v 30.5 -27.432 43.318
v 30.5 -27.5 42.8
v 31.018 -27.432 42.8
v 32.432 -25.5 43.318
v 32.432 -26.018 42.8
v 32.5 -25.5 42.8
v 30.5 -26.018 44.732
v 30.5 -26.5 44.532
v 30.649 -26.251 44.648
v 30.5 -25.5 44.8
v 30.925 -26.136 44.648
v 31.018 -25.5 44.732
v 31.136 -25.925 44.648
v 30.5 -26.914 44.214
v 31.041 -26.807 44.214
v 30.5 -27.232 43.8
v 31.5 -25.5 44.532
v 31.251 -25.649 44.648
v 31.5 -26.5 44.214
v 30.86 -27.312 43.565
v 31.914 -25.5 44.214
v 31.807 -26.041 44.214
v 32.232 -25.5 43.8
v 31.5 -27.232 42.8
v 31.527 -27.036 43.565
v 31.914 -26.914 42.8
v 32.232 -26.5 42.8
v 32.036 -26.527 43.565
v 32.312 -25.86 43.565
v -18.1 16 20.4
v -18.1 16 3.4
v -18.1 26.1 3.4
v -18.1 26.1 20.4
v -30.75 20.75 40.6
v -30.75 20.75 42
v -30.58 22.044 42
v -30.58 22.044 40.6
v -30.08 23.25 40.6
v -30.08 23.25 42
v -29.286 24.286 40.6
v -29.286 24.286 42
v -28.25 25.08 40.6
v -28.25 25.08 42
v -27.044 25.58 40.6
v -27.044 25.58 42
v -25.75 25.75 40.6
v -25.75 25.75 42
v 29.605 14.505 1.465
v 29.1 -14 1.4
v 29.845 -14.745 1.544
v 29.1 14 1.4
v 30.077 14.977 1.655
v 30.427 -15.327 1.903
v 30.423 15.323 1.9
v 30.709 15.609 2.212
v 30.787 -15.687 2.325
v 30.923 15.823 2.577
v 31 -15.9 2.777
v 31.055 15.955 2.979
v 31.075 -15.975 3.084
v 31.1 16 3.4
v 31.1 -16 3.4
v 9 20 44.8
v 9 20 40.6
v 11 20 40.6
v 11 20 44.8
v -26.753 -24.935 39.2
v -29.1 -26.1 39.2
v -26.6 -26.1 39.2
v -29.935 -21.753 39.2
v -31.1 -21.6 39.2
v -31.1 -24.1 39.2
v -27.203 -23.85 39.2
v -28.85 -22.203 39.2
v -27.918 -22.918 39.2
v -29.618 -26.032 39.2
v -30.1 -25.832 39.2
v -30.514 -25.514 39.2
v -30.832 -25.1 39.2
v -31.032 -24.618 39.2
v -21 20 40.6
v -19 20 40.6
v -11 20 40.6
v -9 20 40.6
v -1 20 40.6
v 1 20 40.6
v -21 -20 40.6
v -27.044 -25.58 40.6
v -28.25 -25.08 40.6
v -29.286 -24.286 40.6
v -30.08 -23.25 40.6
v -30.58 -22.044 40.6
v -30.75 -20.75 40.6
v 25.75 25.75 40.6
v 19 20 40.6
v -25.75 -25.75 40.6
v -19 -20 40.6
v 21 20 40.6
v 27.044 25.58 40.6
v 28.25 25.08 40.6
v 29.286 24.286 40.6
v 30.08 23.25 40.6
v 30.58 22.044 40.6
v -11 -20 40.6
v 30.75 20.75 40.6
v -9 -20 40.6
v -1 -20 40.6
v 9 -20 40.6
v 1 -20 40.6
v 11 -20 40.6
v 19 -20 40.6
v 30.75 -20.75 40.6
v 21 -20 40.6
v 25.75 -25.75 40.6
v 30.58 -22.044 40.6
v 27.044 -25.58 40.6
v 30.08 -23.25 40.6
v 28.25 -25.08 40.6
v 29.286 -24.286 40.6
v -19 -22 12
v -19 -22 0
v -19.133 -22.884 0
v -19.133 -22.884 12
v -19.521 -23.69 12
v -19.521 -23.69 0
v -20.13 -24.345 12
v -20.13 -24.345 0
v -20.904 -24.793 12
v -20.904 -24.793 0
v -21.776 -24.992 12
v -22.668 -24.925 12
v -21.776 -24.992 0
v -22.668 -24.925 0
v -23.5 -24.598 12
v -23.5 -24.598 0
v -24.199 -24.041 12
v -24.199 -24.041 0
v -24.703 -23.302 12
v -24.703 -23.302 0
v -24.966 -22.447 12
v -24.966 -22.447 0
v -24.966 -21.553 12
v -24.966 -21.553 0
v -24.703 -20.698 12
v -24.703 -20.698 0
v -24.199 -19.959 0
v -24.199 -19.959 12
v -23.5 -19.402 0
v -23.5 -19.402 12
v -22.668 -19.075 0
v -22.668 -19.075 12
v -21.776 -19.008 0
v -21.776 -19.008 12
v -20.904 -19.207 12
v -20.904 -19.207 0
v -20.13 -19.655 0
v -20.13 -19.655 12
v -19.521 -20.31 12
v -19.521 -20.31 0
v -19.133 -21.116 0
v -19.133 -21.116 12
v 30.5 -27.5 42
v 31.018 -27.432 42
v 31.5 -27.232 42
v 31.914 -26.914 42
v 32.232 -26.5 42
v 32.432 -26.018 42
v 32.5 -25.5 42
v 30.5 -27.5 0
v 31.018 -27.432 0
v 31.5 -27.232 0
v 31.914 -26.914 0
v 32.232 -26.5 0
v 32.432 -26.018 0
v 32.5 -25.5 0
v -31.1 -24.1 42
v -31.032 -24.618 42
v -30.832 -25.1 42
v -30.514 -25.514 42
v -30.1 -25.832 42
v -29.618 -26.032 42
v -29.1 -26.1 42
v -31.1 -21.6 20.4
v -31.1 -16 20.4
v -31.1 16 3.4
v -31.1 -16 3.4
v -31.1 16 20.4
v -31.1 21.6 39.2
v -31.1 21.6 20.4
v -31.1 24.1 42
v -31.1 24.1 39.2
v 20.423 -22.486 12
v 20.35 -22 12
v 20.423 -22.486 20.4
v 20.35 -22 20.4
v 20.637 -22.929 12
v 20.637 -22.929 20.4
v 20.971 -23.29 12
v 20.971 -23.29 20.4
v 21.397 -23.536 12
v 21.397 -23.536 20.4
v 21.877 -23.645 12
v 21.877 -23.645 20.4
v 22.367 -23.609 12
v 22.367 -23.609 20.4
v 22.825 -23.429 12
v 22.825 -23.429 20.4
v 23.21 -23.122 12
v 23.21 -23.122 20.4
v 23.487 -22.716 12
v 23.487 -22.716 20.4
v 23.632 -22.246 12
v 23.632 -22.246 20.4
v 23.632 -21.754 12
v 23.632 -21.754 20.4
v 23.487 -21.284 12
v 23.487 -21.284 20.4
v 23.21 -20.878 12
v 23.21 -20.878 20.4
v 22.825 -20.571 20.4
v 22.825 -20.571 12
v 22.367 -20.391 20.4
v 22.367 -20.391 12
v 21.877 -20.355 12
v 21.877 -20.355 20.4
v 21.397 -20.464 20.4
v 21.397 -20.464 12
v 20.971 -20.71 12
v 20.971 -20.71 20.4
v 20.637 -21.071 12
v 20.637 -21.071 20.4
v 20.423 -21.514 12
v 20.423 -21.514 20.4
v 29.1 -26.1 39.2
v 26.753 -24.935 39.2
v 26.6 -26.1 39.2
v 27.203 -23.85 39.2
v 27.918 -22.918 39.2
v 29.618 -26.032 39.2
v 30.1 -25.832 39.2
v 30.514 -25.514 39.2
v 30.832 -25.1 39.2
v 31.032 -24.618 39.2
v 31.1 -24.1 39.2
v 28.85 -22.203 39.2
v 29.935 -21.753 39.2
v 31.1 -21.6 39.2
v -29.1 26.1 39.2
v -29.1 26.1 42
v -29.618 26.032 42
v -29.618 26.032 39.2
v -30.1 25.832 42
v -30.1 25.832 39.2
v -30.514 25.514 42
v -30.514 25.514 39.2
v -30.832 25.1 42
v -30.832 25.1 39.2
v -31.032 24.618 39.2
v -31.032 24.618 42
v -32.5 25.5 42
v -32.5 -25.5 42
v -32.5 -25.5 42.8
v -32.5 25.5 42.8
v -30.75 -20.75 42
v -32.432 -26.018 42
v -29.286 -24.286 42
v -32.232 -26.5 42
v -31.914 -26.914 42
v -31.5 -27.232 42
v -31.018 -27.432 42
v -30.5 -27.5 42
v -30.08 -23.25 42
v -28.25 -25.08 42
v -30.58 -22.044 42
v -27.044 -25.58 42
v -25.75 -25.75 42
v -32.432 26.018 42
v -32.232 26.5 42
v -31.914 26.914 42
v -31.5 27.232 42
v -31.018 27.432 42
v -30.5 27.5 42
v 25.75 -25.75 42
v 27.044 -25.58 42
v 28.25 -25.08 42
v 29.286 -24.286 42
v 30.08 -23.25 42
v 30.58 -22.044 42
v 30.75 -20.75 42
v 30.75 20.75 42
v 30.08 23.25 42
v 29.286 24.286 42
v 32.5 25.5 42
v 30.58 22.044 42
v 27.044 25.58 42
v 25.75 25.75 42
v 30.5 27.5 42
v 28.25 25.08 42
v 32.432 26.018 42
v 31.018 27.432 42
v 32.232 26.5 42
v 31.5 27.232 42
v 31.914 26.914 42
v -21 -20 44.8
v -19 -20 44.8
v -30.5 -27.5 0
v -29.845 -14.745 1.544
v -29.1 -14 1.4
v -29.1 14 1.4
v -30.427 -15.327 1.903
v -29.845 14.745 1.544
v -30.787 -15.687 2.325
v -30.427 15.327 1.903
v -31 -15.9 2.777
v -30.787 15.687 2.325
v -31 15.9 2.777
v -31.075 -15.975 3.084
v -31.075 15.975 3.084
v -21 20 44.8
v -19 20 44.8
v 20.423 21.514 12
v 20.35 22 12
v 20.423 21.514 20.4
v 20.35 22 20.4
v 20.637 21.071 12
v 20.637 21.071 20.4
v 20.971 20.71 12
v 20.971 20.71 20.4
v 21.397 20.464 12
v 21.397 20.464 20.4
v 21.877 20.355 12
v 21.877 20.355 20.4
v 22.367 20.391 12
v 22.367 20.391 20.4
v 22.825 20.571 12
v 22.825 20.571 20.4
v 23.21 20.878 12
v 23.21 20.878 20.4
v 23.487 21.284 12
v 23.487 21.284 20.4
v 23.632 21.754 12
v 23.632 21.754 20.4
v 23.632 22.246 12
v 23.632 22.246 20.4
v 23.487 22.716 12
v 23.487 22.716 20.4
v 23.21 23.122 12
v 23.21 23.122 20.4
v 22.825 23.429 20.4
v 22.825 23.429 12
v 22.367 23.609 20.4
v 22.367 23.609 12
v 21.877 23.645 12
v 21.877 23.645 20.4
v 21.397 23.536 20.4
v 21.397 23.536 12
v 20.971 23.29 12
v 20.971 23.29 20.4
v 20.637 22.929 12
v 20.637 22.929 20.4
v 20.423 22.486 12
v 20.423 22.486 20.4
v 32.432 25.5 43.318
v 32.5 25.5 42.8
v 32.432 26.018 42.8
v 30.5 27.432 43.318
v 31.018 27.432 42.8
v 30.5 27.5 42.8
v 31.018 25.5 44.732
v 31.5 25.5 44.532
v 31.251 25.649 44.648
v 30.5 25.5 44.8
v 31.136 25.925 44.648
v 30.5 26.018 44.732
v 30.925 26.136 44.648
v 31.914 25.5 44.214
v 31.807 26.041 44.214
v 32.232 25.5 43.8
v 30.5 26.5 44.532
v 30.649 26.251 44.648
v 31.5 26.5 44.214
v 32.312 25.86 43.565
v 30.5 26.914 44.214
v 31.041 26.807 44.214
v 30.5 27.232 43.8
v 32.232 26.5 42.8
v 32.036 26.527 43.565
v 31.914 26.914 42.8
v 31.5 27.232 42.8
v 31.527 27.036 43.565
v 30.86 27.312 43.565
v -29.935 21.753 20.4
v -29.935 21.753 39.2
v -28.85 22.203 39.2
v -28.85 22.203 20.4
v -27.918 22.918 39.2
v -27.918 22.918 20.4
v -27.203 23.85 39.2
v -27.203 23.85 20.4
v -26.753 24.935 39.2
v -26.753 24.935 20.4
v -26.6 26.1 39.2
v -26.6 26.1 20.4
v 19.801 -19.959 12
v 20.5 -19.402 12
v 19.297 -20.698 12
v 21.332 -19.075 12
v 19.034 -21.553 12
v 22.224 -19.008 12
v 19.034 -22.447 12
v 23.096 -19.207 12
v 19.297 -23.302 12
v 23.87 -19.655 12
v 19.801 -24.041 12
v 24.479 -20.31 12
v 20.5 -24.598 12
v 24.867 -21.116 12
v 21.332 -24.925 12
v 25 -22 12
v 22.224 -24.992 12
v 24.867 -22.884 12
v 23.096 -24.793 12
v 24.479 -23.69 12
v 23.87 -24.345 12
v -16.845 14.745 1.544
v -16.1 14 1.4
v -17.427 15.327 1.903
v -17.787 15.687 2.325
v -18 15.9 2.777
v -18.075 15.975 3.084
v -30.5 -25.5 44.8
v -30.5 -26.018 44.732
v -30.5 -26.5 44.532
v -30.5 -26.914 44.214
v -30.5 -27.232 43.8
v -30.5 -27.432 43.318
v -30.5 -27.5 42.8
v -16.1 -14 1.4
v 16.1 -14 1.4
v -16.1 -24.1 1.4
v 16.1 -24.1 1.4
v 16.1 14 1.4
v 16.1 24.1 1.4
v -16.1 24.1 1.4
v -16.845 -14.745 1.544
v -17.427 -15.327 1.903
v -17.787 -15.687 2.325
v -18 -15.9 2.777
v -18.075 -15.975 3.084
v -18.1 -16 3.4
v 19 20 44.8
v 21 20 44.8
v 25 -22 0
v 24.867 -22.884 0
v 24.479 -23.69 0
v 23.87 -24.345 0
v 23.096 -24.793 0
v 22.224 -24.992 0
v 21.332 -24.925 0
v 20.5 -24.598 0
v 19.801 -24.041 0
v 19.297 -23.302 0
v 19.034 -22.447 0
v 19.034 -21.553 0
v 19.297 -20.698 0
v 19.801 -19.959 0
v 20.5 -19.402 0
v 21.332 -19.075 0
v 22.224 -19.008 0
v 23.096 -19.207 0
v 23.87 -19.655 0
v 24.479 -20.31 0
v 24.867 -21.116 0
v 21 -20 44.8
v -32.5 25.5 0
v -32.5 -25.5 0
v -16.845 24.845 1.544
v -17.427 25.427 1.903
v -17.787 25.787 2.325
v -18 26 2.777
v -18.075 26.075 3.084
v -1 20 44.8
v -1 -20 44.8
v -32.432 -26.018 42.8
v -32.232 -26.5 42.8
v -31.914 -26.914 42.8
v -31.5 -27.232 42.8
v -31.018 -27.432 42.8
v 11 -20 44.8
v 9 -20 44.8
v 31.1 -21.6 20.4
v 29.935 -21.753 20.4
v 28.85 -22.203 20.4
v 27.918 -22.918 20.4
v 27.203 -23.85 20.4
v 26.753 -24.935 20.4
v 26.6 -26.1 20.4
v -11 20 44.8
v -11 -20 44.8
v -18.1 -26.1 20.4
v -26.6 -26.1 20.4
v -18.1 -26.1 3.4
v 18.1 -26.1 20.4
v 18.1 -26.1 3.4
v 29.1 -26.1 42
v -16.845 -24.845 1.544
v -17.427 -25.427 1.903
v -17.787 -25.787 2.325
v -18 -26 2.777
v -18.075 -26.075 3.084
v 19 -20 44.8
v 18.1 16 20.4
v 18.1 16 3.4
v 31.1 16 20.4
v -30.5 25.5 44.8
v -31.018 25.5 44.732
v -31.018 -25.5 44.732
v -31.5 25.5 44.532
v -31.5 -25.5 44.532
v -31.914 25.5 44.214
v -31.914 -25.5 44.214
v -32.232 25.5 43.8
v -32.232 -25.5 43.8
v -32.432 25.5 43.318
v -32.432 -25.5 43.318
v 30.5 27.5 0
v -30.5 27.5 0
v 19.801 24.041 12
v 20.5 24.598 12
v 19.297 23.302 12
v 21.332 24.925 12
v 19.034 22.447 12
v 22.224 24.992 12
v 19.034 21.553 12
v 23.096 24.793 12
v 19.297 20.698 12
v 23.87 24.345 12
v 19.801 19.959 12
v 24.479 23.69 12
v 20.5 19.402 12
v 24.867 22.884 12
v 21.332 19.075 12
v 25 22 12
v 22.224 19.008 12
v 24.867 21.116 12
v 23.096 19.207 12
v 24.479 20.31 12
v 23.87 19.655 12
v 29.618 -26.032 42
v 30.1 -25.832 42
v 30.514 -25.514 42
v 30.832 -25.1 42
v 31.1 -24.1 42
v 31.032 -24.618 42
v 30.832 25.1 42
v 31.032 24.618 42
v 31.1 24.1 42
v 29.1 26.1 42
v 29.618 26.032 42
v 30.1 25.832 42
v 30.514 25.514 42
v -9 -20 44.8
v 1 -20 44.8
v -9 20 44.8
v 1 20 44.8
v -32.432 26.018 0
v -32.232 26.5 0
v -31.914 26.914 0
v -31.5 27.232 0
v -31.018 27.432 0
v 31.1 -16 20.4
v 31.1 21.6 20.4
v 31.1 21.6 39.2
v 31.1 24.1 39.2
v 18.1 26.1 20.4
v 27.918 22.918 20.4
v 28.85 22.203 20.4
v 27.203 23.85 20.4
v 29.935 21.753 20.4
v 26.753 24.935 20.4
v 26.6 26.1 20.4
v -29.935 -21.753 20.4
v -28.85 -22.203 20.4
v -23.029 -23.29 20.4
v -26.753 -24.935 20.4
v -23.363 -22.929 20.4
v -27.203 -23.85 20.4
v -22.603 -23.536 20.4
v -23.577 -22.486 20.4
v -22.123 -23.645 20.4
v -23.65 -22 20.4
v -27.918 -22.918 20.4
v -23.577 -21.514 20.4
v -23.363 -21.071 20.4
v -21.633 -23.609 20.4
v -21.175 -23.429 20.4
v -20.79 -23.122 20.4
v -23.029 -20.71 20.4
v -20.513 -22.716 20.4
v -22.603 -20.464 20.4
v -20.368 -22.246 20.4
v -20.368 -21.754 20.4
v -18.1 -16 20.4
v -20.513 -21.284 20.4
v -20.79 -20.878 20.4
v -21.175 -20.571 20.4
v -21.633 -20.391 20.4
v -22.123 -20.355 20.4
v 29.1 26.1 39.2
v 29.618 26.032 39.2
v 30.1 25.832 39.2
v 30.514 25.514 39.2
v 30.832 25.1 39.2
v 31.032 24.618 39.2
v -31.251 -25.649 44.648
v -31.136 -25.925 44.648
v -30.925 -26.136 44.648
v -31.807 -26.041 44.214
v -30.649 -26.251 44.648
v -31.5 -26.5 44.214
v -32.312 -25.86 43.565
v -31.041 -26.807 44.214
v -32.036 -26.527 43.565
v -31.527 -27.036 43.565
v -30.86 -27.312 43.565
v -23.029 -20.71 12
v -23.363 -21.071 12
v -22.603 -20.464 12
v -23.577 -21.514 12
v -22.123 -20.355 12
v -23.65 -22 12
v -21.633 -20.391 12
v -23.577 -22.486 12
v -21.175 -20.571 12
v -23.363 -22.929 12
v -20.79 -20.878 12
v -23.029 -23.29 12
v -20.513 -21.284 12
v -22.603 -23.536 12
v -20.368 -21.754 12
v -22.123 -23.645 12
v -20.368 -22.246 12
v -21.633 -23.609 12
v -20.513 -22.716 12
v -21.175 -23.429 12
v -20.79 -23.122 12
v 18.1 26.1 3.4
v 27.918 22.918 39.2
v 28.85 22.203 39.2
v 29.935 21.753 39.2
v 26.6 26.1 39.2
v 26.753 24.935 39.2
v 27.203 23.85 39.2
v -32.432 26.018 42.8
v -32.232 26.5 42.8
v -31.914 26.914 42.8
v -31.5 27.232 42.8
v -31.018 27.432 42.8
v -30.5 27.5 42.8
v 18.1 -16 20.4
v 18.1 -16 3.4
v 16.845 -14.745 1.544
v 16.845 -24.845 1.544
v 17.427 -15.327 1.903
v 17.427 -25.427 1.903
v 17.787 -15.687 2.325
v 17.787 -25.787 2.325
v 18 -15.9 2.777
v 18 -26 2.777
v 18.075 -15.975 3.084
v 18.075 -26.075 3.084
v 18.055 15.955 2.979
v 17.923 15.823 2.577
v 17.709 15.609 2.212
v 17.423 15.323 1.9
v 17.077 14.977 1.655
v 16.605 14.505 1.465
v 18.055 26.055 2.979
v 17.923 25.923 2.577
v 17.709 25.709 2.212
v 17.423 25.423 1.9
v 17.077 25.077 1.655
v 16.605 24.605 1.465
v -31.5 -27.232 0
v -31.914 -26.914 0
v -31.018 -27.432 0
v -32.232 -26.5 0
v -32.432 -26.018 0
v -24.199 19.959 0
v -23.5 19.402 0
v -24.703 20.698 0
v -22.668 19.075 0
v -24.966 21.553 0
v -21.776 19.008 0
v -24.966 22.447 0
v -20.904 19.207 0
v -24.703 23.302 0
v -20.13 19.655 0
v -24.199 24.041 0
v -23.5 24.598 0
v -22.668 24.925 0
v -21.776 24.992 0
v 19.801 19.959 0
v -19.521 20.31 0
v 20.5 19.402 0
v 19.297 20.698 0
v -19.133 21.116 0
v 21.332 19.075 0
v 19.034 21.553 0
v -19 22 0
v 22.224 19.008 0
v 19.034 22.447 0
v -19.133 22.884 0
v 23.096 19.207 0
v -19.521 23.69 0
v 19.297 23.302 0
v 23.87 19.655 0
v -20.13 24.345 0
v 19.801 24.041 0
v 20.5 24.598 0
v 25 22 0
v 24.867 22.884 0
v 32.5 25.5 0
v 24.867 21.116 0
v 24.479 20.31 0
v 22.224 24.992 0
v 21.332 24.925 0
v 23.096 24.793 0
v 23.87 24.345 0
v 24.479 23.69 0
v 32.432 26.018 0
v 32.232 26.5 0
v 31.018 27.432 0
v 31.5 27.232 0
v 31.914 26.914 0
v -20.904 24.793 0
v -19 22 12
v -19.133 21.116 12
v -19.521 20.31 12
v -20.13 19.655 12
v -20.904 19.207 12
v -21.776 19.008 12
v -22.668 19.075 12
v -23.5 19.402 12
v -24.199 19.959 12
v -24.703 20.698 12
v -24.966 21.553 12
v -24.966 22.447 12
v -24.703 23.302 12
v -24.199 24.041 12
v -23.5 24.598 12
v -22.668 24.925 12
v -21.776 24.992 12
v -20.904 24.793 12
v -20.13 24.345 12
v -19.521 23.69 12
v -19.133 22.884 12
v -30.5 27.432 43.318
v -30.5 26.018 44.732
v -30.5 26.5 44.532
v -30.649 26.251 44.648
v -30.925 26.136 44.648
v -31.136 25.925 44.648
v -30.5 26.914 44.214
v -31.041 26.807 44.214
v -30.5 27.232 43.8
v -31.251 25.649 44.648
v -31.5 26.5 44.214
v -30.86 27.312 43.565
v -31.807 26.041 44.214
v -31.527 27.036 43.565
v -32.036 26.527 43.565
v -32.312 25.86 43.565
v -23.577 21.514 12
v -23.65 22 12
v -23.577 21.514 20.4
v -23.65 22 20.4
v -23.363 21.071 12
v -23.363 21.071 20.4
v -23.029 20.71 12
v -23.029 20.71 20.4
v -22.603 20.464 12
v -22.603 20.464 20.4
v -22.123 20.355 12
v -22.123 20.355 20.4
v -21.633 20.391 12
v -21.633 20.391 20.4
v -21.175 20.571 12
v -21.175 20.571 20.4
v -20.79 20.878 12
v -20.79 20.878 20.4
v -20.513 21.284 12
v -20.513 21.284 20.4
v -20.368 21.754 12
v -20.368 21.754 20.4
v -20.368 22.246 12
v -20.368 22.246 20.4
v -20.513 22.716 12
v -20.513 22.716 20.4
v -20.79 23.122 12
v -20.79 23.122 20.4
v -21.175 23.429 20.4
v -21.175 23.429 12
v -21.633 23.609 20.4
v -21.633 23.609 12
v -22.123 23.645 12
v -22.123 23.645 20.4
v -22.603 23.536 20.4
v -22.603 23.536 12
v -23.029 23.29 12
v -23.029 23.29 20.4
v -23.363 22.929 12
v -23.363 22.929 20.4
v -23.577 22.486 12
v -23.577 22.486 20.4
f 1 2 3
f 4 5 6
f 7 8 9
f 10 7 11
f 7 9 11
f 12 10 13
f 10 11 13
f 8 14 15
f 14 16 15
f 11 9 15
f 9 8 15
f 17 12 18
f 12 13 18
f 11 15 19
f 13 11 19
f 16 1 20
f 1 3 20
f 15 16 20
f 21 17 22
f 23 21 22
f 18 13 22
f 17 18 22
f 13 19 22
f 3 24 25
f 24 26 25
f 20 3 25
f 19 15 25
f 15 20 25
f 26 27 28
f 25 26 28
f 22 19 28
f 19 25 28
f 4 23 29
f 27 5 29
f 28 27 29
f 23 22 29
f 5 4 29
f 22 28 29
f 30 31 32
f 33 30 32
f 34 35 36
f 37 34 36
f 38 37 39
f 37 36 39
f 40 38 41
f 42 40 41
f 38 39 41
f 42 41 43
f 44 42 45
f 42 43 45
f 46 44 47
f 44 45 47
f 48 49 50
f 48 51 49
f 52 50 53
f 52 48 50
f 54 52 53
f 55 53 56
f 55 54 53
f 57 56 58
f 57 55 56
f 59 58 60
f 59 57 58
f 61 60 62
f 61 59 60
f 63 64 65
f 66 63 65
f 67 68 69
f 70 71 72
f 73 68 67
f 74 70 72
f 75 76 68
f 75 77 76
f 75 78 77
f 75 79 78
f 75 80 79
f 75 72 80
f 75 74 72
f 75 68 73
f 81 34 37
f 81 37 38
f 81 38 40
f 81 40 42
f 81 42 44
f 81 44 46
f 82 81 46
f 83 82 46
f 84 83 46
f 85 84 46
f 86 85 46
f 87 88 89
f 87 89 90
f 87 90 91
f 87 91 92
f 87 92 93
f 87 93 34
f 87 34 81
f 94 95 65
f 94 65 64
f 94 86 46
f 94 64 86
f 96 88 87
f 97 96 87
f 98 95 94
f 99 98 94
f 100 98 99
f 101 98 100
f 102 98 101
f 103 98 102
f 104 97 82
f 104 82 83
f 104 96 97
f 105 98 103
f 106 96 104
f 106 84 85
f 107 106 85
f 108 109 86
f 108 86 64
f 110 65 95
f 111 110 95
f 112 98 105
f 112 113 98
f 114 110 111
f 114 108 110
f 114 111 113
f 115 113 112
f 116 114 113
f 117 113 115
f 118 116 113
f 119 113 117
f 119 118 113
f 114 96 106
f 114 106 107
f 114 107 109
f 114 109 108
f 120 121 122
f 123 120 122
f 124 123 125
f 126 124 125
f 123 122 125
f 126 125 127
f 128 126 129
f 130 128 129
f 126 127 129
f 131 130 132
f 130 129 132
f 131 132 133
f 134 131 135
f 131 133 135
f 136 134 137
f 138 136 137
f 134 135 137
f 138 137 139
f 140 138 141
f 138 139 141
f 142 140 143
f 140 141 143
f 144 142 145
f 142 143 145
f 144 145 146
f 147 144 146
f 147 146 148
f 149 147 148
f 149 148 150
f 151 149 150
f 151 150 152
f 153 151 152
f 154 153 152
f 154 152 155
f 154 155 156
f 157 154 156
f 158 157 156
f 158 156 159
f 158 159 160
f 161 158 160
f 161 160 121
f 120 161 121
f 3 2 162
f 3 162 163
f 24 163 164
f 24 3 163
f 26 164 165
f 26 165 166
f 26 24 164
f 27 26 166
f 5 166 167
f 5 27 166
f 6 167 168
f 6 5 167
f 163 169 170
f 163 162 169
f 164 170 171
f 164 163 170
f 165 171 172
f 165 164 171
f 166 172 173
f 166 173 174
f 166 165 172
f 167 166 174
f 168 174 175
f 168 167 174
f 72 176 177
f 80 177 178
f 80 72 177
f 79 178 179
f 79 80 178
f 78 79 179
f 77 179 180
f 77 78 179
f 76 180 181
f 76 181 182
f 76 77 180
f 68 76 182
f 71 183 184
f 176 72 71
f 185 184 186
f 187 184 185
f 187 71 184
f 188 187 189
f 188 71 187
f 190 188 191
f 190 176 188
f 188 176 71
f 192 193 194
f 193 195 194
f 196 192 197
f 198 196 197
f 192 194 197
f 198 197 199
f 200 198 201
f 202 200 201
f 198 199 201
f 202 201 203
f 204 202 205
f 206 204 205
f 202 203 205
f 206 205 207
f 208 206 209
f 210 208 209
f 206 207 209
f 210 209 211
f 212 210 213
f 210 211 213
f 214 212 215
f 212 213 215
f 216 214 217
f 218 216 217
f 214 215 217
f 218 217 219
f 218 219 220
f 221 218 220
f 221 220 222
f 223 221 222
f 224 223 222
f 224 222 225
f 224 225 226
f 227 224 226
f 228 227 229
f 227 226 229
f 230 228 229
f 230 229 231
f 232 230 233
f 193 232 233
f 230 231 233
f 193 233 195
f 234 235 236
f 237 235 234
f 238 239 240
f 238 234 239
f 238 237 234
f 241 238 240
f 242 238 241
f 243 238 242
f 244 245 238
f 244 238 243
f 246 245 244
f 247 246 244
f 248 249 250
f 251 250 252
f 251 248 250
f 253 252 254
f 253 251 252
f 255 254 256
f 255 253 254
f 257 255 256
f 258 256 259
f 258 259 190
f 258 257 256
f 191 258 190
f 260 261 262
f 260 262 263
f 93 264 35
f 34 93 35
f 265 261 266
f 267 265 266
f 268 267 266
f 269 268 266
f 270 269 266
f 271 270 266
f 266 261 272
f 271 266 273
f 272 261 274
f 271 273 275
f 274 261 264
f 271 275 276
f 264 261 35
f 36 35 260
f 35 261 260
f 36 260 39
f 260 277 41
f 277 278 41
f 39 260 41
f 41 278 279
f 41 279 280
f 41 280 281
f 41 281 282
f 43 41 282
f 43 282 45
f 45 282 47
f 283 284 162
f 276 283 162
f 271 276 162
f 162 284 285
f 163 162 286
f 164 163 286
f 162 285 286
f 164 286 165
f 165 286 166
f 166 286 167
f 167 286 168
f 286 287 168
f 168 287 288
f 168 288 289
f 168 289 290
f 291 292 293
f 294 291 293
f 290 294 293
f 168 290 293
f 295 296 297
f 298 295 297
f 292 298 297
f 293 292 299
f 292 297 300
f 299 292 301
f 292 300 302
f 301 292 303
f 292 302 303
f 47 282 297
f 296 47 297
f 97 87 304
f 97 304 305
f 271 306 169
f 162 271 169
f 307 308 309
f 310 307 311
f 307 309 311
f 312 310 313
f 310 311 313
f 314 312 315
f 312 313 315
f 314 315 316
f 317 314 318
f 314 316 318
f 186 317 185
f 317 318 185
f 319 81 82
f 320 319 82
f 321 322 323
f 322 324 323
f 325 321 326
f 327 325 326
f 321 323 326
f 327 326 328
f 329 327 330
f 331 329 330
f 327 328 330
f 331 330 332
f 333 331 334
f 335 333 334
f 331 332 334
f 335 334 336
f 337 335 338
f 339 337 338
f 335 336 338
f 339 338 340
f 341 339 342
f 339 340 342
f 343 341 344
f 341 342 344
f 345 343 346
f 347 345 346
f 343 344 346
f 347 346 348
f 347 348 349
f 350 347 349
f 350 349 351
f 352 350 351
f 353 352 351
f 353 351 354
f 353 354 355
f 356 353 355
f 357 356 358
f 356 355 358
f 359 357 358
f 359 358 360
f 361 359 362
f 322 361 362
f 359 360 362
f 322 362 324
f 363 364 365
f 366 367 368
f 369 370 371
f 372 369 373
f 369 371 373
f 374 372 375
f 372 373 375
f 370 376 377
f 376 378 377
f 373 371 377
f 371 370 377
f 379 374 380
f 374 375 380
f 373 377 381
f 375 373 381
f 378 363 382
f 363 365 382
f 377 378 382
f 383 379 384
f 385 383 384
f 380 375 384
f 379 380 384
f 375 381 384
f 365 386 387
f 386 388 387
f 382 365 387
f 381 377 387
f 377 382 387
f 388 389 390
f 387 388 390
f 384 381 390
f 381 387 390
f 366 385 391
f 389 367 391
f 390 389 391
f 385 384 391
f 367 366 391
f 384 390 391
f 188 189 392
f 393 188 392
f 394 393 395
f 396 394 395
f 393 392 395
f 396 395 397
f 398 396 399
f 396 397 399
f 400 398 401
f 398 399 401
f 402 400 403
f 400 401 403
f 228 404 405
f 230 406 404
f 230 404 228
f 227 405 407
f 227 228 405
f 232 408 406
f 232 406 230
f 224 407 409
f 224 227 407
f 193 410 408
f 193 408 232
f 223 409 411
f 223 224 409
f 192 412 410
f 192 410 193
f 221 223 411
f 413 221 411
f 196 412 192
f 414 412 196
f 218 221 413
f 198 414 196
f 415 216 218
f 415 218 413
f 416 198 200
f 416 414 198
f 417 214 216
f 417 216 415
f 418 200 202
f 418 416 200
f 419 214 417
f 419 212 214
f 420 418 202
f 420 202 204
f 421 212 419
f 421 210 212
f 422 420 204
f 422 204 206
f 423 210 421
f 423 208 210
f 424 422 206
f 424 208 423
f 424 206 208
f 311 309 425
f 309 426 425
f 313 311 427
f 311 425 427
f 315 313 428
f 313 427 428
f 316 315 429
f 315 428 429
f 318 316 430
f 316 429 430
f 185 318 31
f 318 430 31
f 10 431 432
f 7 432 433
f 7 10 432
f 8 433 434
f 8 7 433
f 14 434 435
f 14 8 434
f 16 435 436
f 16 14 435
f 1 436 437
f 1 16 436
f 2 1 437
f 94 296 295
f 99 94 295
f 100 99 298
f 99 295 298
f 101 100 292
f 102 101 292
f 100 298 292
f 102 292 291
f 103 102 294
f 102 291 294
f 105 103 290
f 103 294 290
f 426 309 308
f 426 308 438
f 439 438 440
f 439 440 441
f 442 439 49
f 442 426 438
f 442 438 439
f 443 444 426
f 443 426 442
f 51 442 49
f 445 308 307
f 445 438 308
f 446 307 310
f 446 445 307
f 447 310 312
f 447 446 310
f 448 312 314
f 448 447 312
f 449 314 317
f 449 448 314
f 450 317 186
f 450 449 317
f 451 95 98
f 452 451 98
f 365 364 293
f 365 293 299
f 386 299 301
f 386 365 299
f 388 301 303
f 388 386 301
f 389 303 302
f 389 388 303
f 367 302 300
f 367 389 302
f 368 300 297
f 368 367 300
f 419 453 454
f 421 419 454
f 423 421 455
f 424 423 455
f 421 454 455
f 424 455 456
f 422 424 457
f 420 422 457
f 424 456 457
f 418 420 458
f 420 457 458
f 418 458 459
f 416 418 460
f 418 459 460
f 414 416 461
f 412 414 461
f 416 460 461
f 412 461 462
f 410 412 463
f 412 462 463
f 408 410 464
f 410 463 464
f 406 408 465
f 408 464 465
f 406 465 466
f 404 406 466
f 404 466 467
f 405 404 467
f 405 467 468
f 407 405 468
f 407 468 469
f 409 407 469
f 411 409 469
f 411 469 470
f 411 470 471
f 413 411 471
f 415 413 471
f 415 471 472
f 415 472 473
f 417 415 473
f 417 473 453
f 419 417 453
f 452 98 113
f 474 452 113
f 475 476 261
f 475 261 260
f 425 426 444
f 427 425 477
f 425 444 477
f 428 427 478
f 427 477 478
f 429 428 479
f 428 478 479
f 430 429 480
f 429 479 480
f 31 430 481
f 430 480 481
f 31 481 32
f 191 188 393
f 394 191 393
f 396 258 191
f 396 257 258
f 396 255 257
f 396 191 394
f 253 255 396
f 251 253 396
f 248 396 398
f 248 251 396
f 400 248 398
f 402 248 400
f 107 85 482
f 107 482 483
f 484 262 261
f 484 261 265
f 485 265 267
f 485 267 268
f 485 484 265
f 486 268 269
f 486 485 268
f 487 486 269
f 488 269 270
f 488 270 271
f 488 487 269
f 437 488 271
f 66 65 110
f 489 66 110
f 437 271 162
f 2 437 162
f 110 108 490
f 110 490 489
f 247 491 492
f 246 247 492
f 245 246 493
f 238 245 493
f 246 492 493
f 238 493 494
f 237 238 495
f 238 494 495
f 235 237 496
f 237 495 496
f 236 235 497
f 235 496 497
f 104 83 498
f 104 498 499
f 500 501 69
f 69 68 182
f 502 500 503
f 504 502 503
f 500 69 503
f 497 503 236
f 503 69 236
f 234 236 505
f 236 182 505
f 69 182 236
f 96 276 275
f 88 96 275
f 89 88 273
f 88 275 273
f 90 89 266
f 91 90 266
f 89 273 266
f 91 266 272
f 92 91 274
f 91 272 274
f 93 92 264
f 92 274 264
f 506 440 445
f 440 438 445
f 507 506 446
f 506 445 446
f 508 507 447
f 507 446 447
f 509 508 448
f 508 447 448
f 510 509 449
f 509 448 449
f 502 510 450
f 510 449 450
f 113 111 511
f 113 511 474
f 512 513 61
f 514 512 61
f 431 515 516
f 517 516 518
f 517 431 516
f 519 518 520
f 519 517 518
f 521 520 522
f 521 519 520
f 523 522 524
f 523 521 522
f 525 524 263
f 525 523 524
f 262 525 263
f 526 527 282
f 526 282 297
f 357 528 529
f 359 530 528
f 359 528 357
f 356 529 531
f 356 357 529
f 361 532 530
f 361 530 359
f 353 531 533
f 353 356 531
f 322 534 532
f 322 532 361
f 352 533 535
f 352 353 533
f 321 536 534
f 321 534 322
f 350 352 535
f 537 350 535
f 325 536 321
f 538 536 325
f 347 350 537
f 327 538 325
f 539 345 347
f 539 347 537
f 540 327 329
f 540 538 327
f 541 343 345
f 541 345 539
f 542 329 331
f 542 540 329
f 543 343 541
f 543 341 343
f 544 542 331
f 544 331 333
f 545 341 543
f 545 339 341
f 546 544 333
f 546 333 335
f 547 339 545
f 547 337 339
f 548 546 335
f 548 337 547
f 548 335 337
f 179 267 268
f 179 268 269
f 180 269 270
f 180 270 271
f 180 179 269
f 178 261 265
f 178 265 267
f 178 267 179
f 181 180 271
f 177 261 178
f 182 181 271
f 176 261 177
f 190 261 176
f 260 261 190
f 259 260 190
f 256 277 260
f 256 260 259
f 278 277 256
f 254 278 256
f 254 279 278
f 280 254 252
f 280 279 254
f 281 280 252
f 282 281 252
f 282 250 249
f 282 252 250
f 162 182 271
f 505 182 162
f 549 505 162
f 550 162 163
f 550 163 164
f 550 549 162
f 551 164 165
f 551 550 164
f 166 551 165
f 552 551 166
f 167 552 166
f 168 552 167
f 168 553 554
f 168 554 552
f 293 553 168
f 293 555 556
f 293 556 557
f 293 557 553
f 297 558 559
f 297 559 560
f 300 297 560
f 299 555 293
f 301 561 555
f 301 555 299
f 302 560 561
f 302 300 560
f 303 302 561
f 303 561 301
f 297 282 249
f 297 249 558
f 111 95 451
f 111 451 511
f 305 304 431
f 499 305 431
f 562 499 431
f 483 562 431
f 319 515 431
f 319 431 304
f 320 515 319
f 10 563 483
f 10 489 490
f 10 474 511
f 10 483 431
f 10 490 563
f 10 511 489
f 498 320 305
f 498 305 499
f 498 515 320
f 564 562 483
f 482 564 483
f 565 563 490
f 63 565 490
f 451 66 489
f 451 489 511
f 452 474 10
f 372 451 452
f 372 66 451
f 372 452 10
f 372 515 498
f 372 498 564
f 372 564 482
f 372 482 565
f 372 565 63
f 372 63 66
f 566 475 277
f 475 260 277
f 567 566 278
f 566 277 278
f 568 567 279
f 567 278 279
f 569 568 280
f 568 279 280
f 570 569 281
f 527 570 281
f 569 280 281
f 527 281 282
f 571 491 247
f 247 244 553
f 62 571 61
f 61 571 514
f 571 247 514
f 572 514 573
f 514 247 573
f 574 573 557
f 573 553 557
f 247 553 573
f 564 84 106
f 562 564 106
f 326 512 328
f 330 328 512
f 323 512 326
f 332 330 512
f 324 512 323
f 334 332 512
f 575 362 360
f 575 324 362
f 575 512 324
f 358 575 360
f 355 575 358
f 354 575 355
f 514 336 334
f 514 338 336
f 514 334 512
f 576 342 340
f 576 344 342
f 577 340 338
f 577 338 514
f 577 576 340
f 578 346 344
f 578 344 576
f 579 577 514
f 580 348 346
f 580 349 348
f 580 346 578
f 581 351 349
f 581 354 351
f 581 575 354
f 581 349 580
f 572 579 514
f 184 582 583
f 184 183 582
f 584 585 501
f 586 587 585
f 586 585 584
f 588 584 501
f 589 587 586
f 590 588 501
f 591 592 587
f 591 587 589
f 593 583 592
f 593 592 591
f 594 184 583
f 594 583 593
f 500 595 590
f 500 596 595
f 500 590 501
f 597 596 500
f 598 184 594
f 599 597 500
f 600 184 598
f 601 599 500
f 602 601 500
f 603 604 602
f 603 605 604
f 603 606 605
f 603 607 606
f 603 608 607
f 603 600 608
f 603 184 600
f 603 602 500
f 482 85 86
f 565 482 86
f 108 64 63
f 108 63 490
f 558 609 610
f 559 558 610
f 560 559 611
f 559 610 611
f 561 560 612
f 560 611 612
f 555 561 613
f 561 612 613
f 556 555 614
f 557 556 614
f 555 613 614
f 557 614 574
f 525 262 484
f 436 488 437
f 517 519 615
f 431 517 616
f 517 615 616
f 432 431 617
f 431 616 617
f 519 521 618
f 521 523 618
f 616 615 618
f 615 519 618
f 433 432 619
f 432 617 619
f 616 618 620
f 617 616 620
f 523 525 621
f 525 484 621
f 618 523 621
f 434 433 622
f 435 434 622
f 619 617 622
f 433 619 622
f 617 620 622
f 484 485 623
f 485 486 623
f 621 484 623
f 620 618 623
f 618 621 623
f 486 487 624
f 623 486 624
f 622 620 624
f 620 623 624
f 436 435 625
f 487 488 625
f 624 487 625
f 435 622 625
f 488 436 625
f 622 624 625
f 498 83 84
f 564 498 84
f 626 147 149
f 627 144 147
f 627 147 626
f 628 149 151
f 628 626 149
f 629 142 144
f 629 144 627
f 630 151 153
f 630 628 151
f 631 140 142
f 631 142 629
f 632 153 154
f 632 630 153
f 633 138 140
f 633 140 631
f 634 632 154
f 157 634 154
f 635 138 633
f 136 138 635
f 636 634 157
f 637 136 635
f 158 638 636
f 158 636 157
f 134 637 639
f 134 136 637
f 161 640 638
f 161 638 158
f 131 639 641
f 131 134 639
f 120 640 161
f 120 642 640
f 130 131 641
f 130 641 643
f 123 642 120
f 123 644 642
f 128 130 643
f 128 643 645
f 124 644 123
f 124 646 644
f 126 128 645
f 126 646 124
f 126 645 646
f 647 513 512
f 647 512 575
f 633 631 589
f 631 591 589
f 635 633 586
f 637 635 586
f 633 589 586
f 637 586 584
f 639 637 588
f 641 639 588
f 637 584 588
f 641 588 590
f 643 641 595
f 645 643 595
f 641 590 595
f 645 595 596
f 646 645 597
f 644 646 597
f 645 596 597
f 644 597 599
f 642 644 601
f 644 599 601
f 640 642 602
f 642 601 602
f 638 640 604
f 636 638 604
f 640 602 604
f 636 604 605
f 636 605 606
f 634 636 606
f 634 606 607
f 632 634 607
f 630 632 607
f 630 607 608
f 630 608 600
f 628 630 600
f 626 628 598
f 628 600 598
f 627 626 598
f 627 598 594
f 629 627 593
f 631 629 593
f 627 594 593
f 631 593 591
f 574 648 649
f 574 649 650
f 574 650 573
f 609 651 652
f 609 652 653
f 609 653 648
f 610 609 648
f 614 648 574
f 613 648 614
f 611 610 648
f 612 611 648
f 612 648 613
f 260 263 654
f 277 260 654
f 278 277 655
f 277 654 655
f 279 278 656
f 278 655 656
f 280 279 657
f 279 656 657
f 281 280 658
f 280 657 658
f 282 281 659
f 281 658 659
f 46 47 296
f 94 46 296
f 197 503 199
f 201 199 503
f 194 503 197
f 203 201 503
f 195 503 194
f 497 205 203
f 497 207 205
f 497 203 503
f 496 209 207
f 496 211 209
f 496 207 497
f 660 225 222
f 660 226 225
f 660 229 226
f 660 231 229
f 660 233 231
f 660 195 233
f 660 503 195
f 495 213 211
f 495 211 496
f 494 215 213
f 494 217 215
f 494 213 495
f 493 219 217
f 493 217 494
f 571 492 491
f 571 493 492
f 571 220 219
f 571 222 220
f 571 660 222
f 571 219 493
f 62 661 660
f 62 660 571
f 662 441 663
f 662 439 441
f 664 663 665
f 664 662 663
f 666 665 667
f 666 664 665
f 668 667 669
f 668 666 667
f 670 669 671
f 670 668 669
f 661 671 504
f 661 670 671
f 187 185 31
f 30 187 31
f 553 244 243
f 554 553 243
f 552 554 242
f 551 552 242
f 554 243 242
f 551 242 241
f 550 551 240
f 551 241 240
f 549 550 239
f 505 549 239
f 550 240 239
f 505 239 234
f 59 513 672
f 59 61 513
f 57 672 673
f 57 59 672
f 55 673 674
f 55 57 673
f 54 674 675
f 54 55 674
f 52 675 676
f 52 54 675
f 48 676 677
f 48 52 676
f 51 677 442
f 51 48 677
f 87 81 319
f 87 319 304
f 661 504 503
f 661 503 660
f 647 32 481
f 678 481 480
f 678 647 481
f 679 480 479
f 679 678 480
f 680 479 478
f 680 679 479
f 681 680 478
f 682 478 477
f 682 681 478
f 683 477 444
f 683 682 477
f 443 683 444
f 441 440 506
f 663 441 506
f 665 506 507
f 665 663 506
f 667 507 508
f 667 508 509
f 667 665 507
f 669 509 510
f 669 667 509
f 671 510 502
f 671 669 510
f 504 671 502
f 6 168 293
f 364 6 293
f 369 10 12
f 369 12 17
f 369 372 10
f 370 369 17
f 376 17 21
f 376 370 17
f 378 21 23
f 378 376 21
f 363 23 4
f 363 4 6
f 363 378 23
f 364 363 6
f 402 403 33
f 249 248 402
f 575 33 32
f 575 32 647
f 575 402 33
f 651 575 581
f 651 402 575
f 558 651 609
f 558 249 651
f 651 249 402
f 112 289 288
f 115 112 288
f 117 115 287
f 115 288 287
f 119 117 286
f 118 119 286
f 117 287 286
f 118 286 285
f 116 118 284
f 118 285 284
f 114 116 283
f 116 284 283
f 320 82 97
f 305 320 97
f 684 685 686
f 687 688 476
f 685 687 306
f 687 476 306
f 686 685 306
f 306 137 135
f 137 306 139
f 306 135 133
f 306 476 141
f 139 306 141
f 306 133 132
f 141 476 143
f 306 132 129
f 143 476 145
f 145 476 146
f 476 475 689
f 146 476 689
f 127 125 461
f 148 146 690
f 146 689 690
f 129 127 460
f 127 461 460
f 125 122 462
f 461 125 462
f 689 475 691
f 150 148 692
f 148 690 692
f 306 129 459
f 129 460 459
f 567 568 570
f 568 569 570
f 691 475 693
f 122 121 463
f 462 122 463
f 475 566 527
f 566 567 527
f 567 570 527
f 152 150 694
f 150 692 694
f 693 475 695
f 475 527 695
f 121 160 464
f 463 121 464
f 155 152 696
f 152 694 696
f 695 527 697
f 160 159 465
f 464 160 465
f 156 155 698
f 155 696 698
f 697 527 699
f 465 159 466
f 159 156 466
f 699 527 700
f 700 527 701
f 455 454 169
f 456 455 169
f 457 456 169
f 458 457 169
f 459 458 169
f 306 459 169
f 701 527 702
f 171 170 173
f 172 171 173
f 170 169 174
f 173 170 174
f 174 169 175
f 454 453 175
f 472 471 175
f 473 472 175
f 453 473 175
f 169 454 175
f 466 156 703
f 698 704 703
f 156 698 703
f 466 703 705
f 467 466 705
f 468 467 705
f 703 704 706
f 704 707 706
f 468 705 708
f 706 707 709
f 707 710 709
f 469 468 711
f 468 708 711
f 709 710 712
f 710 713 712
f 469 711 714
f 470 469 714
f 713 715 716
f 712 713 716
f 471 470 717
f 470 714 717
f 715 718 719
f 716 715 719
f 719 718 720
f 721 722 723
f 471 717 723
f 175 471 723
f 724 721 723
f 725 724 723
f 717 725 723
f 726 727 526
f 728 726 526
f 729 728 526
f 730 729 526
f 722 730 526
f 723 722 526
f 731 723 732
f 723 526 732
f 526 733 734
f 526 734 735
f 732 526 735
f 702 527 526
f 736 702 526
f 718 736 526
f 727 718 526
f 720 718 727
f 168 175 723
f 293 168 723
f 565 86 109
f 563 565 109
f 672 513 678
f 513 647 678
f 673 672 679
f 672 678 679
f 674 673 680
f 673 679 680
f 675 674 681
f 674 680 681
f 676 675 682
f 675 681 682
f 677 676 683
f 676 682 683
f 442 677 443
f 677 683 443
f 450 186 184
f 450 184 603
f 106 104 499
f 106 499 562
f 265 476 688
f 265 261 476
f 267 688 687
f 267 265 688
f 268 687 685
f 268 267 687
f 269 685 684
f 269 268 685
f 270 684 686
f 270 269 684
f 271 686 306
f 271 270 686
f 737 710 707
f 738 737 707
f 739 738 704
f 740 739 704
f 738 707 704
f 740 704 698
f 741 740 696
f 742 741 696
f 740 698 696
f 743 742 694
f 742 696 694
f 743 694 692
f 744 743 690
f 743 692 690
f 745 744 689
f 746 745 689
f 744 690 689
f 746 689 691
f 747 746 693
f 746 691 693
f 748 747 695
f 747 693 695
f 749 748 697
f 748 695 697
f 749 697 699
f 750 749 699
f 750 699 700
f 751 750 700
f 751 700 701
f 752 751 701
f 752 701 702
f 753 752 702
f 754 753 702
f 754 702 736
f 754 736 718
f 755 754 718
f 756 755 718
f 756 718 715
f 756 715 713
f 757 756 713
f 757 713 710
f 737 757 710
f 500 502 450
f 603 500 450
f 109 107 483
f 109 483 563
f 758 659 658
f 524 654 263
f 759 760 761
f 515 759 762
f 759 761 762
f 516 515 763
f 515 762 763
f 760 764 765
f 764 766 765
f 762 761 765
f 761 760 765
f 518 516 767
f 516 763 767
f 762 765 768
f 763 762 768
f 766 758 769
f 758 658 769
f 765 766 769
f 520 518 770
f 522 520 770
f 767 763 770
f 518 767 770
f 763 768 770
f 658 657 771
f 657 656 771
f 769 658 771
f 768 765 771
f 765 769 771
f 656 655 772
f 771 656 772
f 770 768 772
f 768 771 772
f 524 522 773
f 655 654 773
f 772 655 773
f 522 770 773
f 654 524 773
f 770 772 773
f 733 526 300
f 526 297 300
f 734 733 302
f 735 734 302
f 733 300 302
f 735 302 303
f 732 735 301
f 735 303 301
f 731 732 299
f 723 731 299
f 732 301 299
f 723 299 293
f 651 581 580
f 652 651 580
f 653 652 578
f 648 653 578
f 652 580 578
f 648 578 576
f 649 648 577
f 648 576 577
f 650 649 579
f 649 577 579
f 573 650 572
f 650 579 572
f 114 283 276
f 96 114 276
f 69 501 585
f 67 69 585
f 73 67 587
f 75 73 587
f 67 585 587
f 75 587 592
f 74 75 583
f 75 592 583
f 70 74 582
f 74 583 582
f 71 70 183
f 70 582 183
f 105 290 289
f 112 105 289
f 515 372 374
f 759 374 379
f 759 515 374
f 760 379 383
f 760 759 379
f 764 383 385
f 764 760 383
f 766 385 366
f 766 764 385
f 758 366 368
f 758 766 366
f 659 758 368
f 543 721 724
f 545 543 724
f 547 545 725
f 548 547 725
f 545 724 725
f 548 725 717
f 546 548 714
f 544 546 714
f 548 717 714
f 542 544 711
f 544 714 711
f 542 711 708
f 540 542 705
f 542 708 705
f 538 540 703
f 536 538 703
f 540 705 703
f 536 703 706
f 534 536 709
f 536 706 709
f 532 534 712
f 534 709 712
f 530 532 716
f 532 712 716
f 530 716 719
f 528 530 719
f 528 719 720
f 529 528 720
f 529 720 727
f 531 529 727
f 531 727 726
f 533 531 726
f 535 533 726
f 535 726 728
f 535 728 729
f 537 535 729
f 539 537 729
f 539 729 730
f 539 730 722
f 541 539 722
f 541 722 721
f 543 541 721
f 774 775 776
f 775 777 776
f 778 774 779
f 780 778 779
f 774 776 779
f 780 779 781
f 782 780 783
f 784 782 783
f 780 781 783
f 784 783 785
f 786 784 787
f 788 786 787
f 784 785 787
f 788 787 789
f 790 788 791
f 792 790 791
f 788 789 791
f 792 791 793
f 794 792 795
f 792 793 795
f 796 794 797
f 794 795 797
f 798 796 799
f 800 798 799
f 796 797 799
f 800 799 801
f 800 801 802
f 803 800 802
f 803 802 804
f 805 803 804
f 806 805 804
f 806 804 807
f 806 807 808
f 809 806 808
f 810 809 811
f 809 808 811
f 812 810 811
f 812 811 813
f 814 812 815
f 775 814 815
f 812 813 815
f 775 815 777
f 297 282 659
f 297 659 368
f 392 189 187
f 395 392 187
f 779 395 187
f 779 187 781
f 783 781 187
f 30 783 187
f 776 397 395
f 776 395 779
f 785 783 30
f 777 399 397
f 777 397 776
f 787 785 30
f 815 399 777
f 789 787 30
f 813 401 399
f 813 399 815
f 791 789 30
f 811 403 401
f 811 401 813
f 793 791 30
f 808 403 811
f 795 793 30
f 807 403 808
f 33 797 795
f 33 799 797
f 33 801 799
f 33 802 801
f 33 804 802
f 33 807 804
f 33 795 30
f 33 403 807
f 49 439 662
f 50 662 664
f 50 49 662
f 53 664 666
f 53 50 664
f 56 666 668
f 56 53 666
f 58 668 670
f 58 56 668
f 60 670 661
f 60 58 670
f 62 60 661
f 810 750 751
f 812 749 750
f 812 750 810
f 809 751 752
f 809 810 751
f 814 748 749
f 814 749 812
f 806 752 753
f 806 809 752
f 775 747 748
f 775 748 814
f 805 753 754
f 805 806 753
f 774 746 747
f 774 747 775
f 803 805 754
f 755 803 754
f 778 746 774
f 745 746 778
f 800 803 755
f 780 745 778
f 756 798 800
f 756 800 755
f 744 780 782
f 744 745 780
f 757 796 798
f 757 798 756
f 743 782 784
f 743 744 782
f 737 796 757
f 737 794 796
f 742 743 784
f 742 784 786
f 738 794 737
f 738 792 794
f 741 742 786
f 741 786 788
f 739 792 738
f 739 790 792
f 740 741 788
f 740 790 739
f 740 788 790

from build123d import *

# Parameters (mm, degrees)
F3_W            = 65
F3_H            = 55
F4_DEPTH        = 42
F5_W            = 62.2
F5_H            = 52.2
F6_DEPTH        = 40.6
F7_W            = 13
F7_H            = 10.1
F8_DEPTH        = 19
F10_D           = 3.3
F10_CBORE_D     = 6
F10_CBORE_DEPTH = 12
F11_R           = 2
F12_R           = 2
F14_R           = 2
F13_W           = 65
F13_H           = 55
F15_DEPTH       = 2.8
F16_R           = 2
F18_DEPTH       = 1.4
F19_W           = 2
F19_H           = 40
F20_DEPTH       = 4.201
F21_R           = 2
F23_DEPTH       = 18.8


with BuildPart() as f4:
    # F3 (on Top) → F4 (new body)
    with BuildSketch(Plane.XY):
        Rectangle(F3_W, F3_H)
    extrude(amount=F4_DEPTH)

    # F5 (on face) → F6 (cut)
    with BuildSketch(Plane.XY.offset(42)):
        Rectangle(F5_W, F5_H)
    extrude(amount=-F6_DEPTH, mode=Mode.SUBTRACT)

    # F7 (on face) → F8 (join)
    with BuildSketch(Plane.XY.offset(1.4)):
        with Locations((24.6, 21.05)):
            Rectangle(F7_W, F7_H)
        with Locations((24.6, -21.05)):
            Rectangle(F7_W, F7_H)
        with Locations((-24.6, -21.05)):
            Rectangle(F7_W, F7_H)
        with Locations((-24.6, 21.05)):
            Rectangle(F7_W, F7_H)
    extrude(amount=F8_DEPTH)

    # F10 (through all)
    with Locations(Plane(origin=(0, 0, 0), x_dir=(1, 0, 0), z_dir=(0, 0, -1))):
        with Locations((22, -22), (-22, -22), (-22, 22), (22, 22)):
            CounterBoreHole(F10_D / 2, F10_CBORE_D / 2, F10_CBORE_DEPTH)

    # F11
    f11_edges = [f4.edges().sort_by_distance(p)[0] for p in [
        (-18.1, -21.05, 1.4),
        (-24.6, -16, 1.4),
        (-31.1, 0, 1.4),
        (-24.6, 16, 1.4),
        (-18.1, 21.05, 1.4),
        (0, 26.1, 1.4),
        (18.1, 21.05, 1.4),
        (24.6, 16, 1.4),
        (31.1, 0, 1.4),
        (24.6, -16, 1.4),
        (18.1, -21.05, 1.4),
        (0, -26.1, 1.4),
    ]]
    fillet(f11_edges, radius=F11_R)

    # F12
    f12_edges = [f4.edges().sort_by_distance(p)[0] for p in [
        (31.1, 26.1, 31.2),
        (-31.1, 26.1, 31.2),
        (-31.1, -26.1, 31.2),
        (31.1, -26.1, 31.2),
    ]]
    fillet(f12_edges, radius=F12_R)

    # F14
    f14_edges = [f4.edges().sort_by_distance(p)[0] for p in [
        (-32.5, -27.5, 21),
        (32.5, -27.5, 21),
        (32.5, 27.5, 21),
        (-32.5, 27.5, 21),
    ]]
    fillet(f14_edges, radius=F14_R)

    # F22 (on face) → F23 (join)
    with BuildSketch(Plane.XY.offset(20.4)):
        with BuildLine():
            Line((26.6, -26.1), (31.1, -26.1))
            Line((31.1, -26.1), (31.1, -21.6))
            ThreePointArc((31.1, -21.6), (27.9180194847, -22.9180194847), (26.6, -26.1))
        make_face()
        with BuildLine():
            Line((-31.1, 26.1), (-31.1, 21.6))
            ThreePointArc((-31.1, 21.6), (-27.9180194847, 22.9180194847), (-26.6, 26.1))
            Line((-26.6, 26.1), (-31.1, 26.1))
        make_face()
        with BuildLine():
            ThreePointArc((-26.6, -26.1), (-27.9180194847, -22.9180194847), (-31.1, -21.6))
            Line((-31.1, -21.6), (-31.1, -26.1))
            Line((-31.1, -26.1), (-26.6, -26.1))
        make_face()
        with BuildLine():
            ThreePointArc((26.6, 26.1), (27.9180194847, 22.9180194847), (31.1, 21.6))
            Line((31.1, 21.6), (31.1, 26.1))
            Line((31.1, 26.1), (26.6, 26.1))
        make_face()
    extrude(amount=F23_DEPTH)


with BuildPart() as f15:
    # F13 (on face) → F15 (new body)
    with BuildSketch(Plane.XY.offset(42)):
        Rectangle(F13_W, F13_H)
    extrude(amount=F15_DEPTH)

    # F16
    f16_edges = [f15.edges().sort_by_distance(p)[0] for p in [
        (-32.5, -27.5, 43.4),
        (32.5, -27.5, 43.4),
        (-32.5, 27.5, 43.4),
        (32.5, 27.5, 43.4),
    ]]
    fillet(f16_edges, radius=F16_R)

    # F17 (on face) → F18 (join)
    with BuildSketch(Plane(origin=(0, 0, 42), x_dir=(1, 0, 0), z_dir=(0, 0, -1))):
        with BuildLine():
            ThreePointArc((25.75, -25.75), (29.2855339059, -24.2855339059), (30.75, -20.75))
            Line((30.75, -20.75), (30.75, 20.75))
            ThreePointArc((30.75, 20.75), (29.2855339059, 24.2855339059), (25.75, 25.75))
            Line((25.75, 25.75), (-25.75, 25.75))
            ThreePointArc((-25.75, 25.75), (-29.2855339059, 24.2855339059), (-30.75, 20.75))
            Line((-30.75, 20.75), (-30.75, -20.75))
            ThreePointArc((-30.75, -20.75), (-29.2855339059, -24.2855339059), (-25.75, -25.75))
            Line((-25.75, -25.75), (25.75, -25.75))
        make_face()
    extrude(amount=F18_DEPTH)

    # F19 (on face) → F20 (cut, through all)
    with BuildSketch(Plane(origin=(0, 0, 40.6), x_dir=(1, 0, 0), z_dir=(0, 0, -1))):
        Rectangle(F19_W, F19_H)
        with Locations((-10, 0)):
            Rectangle(F19_W, F19_H)
        with Locations((-20, 0)):
            Rectangle(F19_W, F19_H)
        with Locations((10, 0)):
            Rectangle(F19_W, F19_H)
        with Locations((20, 0)):
            Rectangle(F19_W, F19_H)
    extrude(amount=-F20_DEPTH, mode=Mode.SUBTRACT)

    # F21
    f21_edges = [f15.edges().sort_by_distance(p)[0] for p in [
        (32.5, 0, 44.8),
        (0, 27.5, 44.8),
        (-32.5, 0, 44.8),
        (0, -27.5, 44.8),
    ]]
    fillet(f21_edges, radius=F21_R)


solid = Compound([f4.part, f15.part])
